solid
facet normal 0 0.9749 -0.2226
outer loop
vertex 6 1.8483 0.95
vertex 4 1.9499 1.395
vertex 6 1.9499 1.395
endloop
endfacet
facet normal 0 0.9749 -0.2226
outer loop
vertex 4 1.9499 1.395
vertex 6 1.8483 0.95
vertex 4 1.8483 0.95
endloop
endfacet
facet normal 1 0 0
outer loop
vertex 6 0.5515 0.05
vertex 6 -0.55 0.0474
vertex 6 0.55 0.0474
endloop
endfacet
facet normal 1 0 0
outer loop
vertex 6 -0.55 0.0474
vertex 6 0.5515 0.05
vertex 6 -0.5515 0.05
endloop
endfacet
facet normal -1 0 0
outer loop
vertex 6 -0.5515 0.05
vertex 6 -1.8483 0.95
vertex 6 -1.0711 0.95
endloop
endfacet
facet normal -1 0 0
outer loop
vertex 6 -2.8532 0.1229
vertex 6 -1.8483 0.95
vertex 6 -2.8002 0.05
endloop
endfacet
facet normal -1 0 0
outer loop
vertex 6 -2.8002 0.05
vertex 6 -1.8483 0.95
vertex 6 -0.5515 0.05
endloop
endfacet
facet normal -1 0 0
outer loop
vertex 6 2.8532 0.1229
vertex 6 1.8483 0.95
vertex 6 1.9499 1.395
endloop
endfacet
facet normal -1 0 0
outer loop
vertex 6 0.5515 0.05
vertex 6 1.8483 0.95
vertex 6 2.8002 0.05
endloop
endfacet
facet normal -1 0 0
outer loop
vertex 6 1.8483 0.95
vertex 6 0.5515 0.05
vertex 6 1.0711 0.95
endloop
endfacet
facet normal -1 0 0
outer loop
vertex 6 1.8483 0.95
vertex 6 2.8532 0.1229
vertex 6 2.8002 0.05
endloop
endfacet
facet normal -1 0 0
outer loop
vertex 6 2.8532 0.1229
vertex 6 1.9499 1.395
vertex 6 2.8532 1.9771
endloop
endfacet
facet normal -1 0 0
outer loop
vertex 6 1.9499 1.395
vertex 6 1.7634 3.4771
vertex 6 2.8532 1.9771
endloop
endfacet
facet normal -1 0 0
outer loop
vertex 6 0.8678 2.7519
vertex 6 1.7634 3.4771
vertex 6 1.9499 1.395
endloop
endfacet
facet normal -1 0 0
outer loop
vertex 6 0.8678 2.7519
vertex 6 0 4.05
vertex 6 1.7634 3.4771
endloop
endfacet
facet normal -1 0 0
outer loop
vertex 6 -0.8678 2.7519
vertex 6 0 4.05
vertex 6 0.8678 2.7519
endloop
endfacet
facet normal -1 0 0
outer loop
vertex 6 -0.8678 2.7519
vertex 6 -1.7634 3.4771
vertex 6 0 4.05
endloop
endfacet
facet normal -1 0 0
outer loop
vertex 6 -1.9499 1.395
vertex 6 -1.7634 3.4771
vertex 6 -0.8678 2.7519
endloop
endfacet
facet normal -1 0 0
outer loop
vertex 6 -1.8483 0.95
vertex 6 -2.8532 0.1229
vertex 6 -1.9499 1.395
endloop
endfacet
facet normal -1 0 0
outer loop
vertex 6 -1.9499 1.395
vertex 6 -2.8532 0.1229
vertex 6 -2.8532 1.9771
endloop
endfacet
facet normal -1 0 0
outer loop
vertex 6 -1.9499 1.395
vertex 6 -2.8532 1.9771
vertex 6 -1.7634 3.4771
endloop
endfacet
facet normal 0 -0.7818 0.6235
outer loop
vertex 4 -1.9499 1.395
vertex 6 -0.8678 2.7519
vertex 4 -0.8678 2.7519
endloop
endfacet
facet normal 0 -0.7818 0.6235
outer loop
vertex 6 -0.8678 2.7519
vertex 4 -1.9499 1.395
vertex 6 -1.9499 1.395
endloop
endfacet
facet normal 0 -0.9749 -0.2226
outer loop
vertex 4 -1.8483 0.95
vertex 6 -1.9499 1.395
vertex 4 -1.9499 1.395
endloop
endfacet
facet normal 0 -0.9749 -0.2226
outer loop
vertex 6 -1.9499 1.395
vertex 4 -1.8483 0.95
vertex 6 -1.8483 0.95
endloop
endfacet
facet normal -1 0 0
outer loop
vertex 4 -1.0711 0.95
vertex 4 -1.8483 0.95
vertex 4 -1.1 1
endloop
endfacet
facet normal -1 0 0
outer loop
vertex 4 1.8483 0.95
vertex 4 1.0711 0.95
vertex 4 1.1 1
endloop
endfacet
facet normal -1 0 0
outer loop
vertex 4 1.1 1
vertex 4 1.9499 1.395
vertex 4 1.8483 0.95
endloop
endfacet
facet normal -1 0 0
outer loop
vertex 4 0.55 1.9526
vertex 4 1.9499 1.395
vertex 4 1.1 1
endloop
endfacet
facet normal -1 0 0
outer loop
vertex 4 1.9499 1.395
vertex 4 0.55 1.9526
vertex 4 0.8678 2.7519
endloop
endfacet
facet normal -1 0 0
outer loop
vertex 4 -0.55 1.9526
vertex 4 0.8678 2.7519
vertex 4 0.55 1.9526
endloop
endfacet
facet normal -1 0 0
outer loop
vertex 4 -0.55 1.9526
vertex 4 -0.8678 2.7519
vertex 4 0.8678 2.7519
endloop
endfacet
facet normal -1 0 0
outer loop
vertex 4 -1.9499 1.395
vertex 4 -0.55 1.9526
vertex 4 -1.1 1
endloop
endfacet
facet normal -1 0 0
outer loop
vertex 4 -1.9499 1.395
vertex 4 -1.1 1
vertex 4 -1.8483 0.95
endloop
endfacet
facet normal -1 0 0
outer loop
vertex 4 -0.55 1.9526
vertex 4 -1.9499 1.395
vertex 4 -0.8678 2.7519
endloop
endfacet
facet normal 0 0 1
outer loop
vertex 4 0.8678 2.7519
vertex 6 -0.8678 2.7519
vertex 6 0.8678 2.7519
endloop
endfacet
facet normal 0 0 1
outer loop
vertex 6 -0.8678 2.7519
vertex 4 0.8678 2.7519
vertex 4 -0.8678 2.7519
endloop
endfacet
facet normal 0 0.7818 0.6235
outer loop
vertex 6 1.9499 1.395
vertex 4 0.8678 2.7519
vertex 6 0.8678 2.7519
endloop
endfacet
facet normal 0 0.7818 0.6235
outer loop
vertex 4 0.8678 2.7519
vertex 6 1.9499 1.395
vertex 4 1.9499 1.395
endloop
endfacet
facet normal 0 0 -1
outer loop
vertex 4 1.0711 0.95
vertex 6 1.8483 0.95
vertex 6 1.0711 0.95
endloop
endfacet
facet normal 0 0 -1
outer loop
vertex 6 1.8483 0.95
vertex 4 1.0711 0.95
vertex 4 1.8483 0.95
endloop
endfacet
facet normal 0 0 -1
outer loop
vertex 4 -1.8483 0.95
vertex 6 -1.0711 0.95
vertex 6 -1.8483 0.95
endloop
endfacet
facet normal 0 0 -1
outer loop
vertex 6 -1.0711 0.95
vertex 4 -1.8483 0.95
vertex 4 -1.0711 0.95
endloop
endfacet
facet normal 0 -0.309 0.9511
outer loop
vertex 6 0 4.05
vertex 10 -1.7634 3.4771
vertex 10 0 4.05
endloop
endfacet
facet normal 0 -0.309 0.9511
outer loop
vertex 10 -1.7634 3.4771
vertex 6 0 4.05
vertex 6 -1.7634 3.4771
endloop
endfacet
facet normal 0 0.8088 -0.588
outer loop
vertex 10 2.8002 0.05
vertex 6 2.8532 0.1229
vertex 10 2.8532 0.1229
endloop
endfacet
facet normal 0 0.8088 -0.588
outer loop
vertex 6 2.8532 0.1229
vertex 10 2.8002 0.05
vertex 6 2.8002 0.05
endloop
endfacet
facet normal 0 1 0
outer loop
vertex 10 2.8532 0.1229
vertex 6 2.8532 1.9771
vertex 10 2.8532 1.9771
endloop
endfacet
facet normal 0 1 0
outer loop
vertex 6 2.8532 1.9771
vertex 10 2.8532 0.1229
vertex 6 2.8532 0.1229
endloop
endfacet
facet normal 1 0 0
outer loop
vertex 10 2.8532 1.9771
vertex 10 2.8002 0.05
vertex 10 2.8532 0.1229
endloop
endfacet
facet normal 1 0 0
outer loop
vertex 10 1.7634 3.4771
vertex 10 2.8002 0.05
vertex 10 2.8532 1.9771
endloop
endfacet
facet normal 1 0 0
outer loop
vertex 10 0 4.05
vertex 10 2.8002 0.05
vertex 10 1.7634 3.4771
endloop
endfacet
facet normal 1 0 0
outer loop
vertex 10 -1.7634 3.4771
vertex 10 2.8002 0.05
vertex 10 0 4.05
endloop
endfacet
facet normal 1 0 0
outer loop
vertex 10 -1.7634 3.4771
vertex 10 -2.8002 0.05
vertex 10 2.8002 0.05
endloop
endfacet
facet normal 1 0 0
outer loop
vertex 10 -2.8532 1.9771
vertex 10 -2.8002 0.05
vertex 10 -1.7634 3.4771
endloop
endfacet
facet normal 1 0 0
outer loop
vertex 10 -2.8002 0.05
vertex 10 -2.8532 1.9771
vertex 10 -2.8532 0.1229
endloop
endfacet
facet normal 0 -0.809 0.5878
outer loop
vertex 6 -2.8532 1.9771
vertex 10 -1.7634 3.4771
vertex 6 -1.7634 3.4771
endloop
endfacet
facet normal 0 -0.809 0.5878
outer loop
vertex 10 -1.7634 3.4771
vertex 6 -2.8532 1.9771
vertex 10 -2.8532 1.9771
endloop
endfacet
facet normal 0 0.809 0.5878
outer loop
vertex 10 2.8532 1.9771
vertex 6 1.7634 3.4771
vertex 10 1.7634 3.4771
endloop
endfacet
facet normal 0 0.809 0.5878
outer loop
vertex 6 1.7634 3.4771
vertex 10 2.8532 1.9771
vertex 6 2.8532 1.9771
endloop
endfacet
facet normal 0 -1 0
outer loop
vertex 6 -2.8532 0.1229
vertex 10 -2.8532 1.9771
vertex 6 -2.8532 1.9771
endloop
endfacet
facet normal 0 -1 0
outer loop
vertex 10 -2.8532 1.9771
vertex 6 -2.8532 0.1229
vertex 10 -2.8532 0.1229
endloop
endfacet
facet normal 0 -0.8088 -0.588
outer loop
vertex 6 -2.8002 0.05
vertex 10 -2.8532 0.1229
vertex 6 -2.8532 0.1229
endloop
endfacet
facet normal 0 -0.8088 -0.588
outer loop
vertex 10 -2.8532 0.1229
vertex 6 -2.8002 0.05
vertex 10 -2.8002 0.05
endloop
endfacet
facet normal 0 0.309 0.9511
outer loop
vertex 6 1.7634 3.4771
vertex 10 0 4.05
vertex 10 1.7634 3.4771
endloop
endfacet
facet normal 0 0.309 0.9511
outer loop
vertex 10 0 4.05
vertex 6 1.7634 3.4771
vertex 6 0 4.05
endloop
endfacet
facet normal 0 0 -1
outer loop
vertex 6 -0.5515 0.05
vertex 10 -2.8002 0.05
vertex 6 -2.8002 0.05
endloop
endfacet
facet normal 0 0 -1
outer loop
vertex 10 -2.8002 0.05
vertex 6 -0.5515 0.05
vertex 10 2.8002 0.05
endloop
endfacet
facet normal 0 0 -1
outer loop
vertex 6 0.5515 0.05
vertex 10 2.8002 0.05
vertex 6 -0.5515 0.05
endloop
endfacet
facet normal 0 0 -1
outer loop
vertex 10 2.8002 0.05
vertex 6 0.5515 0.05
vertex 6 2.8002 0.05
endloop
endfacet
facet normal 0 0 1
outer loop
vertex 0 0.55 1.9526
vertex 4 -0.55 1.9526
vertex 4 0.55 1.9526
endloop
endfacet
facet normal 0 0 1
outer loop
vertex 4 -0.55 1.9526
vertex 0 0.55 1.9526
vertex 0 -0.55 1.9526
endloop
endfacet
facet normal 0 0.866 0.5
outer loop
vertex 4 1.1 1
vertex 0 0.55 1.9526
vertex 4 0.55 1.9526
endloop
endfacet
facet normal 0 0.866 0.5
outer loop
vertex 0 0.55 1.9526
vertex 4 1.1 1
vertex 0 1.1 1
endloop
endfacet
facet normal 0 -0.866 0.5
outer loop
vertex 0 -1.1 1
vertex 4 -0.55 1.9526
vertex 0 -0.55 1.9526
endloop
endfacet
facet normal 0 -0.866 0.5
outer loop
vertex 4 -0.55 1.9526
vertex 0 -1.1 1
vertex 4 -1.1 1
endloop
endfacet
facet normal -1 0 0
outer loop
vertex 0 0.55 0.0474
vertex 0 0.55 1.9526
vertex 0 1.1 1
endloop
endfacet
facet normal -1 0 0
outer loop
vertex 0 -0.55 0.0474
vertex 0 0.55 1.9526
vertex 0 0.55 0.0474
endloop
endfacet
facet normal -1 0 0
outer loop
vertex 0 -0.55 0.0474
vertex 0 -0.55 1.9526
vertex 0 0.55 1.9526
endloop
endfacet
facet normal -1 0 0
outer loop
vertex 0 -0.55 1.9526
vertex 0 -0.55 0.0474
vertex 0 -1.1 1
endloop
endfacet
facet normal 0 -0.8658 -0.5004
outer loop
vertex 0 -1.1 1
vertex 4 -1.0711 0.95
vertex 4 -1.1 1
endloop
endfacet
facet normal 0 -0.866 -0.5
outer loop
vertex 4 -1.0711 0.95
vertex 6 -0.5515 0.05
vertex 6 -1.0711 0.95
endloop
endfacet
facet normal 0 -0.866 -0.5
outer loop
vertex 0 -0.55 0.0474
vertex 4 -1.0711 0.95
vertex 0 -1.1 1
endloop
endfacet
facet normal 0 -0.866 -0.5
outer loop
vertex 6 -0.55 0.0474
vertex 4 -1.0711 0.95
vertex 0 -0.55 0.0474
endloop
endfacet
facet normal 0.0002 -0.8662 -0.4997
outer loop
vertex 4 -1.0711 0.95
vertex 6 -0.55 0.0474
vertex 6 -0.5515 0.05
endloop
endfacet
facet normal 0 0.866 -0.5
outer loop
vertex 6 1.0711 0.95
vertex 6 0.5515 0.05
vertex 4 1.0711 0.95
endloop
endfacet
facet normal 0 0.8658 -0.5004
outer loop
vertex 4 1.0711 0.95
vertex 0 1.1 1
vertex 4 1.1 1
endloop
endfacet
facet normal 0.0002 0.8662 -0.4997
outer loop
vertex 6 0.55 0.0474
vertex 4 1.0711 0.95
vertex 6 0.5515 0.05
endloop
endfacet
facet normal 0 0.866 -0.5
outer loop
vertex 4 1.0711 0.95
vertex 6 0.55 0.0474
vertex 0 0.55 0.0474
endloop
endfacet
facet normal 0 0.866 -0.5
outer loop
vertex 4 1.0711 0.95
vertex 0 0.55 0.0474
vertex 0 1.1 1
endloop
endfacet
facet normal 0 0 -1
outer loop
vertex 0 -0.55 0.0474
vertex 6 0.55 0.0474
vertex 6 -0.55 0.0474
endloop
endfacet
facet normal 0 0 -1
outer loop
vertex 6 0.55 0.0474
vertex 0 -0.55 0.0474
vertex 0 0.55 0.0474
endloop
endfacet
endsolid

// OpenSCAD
translate([0,0,.95]) {
    rotate([0,90,0]) {
        translate([0,0,4]) {
            difference() {
                cylinder(r=2, h=2);
                translate([25,0,0]) cube(50, center=true);
             }
         }
        translate([-0.1,0,6]) {
            difference() {
                cylinder(r=3, h=4);
                translate([25,0,0]) cube(48, center=true);
             }
        }
    }
}

translate([0,0,1]){
rotate([0,90,0]) {
rotate([0,0,90]) {
cylinder(h=6,r=1.1, $fn=6);
}
}
}
